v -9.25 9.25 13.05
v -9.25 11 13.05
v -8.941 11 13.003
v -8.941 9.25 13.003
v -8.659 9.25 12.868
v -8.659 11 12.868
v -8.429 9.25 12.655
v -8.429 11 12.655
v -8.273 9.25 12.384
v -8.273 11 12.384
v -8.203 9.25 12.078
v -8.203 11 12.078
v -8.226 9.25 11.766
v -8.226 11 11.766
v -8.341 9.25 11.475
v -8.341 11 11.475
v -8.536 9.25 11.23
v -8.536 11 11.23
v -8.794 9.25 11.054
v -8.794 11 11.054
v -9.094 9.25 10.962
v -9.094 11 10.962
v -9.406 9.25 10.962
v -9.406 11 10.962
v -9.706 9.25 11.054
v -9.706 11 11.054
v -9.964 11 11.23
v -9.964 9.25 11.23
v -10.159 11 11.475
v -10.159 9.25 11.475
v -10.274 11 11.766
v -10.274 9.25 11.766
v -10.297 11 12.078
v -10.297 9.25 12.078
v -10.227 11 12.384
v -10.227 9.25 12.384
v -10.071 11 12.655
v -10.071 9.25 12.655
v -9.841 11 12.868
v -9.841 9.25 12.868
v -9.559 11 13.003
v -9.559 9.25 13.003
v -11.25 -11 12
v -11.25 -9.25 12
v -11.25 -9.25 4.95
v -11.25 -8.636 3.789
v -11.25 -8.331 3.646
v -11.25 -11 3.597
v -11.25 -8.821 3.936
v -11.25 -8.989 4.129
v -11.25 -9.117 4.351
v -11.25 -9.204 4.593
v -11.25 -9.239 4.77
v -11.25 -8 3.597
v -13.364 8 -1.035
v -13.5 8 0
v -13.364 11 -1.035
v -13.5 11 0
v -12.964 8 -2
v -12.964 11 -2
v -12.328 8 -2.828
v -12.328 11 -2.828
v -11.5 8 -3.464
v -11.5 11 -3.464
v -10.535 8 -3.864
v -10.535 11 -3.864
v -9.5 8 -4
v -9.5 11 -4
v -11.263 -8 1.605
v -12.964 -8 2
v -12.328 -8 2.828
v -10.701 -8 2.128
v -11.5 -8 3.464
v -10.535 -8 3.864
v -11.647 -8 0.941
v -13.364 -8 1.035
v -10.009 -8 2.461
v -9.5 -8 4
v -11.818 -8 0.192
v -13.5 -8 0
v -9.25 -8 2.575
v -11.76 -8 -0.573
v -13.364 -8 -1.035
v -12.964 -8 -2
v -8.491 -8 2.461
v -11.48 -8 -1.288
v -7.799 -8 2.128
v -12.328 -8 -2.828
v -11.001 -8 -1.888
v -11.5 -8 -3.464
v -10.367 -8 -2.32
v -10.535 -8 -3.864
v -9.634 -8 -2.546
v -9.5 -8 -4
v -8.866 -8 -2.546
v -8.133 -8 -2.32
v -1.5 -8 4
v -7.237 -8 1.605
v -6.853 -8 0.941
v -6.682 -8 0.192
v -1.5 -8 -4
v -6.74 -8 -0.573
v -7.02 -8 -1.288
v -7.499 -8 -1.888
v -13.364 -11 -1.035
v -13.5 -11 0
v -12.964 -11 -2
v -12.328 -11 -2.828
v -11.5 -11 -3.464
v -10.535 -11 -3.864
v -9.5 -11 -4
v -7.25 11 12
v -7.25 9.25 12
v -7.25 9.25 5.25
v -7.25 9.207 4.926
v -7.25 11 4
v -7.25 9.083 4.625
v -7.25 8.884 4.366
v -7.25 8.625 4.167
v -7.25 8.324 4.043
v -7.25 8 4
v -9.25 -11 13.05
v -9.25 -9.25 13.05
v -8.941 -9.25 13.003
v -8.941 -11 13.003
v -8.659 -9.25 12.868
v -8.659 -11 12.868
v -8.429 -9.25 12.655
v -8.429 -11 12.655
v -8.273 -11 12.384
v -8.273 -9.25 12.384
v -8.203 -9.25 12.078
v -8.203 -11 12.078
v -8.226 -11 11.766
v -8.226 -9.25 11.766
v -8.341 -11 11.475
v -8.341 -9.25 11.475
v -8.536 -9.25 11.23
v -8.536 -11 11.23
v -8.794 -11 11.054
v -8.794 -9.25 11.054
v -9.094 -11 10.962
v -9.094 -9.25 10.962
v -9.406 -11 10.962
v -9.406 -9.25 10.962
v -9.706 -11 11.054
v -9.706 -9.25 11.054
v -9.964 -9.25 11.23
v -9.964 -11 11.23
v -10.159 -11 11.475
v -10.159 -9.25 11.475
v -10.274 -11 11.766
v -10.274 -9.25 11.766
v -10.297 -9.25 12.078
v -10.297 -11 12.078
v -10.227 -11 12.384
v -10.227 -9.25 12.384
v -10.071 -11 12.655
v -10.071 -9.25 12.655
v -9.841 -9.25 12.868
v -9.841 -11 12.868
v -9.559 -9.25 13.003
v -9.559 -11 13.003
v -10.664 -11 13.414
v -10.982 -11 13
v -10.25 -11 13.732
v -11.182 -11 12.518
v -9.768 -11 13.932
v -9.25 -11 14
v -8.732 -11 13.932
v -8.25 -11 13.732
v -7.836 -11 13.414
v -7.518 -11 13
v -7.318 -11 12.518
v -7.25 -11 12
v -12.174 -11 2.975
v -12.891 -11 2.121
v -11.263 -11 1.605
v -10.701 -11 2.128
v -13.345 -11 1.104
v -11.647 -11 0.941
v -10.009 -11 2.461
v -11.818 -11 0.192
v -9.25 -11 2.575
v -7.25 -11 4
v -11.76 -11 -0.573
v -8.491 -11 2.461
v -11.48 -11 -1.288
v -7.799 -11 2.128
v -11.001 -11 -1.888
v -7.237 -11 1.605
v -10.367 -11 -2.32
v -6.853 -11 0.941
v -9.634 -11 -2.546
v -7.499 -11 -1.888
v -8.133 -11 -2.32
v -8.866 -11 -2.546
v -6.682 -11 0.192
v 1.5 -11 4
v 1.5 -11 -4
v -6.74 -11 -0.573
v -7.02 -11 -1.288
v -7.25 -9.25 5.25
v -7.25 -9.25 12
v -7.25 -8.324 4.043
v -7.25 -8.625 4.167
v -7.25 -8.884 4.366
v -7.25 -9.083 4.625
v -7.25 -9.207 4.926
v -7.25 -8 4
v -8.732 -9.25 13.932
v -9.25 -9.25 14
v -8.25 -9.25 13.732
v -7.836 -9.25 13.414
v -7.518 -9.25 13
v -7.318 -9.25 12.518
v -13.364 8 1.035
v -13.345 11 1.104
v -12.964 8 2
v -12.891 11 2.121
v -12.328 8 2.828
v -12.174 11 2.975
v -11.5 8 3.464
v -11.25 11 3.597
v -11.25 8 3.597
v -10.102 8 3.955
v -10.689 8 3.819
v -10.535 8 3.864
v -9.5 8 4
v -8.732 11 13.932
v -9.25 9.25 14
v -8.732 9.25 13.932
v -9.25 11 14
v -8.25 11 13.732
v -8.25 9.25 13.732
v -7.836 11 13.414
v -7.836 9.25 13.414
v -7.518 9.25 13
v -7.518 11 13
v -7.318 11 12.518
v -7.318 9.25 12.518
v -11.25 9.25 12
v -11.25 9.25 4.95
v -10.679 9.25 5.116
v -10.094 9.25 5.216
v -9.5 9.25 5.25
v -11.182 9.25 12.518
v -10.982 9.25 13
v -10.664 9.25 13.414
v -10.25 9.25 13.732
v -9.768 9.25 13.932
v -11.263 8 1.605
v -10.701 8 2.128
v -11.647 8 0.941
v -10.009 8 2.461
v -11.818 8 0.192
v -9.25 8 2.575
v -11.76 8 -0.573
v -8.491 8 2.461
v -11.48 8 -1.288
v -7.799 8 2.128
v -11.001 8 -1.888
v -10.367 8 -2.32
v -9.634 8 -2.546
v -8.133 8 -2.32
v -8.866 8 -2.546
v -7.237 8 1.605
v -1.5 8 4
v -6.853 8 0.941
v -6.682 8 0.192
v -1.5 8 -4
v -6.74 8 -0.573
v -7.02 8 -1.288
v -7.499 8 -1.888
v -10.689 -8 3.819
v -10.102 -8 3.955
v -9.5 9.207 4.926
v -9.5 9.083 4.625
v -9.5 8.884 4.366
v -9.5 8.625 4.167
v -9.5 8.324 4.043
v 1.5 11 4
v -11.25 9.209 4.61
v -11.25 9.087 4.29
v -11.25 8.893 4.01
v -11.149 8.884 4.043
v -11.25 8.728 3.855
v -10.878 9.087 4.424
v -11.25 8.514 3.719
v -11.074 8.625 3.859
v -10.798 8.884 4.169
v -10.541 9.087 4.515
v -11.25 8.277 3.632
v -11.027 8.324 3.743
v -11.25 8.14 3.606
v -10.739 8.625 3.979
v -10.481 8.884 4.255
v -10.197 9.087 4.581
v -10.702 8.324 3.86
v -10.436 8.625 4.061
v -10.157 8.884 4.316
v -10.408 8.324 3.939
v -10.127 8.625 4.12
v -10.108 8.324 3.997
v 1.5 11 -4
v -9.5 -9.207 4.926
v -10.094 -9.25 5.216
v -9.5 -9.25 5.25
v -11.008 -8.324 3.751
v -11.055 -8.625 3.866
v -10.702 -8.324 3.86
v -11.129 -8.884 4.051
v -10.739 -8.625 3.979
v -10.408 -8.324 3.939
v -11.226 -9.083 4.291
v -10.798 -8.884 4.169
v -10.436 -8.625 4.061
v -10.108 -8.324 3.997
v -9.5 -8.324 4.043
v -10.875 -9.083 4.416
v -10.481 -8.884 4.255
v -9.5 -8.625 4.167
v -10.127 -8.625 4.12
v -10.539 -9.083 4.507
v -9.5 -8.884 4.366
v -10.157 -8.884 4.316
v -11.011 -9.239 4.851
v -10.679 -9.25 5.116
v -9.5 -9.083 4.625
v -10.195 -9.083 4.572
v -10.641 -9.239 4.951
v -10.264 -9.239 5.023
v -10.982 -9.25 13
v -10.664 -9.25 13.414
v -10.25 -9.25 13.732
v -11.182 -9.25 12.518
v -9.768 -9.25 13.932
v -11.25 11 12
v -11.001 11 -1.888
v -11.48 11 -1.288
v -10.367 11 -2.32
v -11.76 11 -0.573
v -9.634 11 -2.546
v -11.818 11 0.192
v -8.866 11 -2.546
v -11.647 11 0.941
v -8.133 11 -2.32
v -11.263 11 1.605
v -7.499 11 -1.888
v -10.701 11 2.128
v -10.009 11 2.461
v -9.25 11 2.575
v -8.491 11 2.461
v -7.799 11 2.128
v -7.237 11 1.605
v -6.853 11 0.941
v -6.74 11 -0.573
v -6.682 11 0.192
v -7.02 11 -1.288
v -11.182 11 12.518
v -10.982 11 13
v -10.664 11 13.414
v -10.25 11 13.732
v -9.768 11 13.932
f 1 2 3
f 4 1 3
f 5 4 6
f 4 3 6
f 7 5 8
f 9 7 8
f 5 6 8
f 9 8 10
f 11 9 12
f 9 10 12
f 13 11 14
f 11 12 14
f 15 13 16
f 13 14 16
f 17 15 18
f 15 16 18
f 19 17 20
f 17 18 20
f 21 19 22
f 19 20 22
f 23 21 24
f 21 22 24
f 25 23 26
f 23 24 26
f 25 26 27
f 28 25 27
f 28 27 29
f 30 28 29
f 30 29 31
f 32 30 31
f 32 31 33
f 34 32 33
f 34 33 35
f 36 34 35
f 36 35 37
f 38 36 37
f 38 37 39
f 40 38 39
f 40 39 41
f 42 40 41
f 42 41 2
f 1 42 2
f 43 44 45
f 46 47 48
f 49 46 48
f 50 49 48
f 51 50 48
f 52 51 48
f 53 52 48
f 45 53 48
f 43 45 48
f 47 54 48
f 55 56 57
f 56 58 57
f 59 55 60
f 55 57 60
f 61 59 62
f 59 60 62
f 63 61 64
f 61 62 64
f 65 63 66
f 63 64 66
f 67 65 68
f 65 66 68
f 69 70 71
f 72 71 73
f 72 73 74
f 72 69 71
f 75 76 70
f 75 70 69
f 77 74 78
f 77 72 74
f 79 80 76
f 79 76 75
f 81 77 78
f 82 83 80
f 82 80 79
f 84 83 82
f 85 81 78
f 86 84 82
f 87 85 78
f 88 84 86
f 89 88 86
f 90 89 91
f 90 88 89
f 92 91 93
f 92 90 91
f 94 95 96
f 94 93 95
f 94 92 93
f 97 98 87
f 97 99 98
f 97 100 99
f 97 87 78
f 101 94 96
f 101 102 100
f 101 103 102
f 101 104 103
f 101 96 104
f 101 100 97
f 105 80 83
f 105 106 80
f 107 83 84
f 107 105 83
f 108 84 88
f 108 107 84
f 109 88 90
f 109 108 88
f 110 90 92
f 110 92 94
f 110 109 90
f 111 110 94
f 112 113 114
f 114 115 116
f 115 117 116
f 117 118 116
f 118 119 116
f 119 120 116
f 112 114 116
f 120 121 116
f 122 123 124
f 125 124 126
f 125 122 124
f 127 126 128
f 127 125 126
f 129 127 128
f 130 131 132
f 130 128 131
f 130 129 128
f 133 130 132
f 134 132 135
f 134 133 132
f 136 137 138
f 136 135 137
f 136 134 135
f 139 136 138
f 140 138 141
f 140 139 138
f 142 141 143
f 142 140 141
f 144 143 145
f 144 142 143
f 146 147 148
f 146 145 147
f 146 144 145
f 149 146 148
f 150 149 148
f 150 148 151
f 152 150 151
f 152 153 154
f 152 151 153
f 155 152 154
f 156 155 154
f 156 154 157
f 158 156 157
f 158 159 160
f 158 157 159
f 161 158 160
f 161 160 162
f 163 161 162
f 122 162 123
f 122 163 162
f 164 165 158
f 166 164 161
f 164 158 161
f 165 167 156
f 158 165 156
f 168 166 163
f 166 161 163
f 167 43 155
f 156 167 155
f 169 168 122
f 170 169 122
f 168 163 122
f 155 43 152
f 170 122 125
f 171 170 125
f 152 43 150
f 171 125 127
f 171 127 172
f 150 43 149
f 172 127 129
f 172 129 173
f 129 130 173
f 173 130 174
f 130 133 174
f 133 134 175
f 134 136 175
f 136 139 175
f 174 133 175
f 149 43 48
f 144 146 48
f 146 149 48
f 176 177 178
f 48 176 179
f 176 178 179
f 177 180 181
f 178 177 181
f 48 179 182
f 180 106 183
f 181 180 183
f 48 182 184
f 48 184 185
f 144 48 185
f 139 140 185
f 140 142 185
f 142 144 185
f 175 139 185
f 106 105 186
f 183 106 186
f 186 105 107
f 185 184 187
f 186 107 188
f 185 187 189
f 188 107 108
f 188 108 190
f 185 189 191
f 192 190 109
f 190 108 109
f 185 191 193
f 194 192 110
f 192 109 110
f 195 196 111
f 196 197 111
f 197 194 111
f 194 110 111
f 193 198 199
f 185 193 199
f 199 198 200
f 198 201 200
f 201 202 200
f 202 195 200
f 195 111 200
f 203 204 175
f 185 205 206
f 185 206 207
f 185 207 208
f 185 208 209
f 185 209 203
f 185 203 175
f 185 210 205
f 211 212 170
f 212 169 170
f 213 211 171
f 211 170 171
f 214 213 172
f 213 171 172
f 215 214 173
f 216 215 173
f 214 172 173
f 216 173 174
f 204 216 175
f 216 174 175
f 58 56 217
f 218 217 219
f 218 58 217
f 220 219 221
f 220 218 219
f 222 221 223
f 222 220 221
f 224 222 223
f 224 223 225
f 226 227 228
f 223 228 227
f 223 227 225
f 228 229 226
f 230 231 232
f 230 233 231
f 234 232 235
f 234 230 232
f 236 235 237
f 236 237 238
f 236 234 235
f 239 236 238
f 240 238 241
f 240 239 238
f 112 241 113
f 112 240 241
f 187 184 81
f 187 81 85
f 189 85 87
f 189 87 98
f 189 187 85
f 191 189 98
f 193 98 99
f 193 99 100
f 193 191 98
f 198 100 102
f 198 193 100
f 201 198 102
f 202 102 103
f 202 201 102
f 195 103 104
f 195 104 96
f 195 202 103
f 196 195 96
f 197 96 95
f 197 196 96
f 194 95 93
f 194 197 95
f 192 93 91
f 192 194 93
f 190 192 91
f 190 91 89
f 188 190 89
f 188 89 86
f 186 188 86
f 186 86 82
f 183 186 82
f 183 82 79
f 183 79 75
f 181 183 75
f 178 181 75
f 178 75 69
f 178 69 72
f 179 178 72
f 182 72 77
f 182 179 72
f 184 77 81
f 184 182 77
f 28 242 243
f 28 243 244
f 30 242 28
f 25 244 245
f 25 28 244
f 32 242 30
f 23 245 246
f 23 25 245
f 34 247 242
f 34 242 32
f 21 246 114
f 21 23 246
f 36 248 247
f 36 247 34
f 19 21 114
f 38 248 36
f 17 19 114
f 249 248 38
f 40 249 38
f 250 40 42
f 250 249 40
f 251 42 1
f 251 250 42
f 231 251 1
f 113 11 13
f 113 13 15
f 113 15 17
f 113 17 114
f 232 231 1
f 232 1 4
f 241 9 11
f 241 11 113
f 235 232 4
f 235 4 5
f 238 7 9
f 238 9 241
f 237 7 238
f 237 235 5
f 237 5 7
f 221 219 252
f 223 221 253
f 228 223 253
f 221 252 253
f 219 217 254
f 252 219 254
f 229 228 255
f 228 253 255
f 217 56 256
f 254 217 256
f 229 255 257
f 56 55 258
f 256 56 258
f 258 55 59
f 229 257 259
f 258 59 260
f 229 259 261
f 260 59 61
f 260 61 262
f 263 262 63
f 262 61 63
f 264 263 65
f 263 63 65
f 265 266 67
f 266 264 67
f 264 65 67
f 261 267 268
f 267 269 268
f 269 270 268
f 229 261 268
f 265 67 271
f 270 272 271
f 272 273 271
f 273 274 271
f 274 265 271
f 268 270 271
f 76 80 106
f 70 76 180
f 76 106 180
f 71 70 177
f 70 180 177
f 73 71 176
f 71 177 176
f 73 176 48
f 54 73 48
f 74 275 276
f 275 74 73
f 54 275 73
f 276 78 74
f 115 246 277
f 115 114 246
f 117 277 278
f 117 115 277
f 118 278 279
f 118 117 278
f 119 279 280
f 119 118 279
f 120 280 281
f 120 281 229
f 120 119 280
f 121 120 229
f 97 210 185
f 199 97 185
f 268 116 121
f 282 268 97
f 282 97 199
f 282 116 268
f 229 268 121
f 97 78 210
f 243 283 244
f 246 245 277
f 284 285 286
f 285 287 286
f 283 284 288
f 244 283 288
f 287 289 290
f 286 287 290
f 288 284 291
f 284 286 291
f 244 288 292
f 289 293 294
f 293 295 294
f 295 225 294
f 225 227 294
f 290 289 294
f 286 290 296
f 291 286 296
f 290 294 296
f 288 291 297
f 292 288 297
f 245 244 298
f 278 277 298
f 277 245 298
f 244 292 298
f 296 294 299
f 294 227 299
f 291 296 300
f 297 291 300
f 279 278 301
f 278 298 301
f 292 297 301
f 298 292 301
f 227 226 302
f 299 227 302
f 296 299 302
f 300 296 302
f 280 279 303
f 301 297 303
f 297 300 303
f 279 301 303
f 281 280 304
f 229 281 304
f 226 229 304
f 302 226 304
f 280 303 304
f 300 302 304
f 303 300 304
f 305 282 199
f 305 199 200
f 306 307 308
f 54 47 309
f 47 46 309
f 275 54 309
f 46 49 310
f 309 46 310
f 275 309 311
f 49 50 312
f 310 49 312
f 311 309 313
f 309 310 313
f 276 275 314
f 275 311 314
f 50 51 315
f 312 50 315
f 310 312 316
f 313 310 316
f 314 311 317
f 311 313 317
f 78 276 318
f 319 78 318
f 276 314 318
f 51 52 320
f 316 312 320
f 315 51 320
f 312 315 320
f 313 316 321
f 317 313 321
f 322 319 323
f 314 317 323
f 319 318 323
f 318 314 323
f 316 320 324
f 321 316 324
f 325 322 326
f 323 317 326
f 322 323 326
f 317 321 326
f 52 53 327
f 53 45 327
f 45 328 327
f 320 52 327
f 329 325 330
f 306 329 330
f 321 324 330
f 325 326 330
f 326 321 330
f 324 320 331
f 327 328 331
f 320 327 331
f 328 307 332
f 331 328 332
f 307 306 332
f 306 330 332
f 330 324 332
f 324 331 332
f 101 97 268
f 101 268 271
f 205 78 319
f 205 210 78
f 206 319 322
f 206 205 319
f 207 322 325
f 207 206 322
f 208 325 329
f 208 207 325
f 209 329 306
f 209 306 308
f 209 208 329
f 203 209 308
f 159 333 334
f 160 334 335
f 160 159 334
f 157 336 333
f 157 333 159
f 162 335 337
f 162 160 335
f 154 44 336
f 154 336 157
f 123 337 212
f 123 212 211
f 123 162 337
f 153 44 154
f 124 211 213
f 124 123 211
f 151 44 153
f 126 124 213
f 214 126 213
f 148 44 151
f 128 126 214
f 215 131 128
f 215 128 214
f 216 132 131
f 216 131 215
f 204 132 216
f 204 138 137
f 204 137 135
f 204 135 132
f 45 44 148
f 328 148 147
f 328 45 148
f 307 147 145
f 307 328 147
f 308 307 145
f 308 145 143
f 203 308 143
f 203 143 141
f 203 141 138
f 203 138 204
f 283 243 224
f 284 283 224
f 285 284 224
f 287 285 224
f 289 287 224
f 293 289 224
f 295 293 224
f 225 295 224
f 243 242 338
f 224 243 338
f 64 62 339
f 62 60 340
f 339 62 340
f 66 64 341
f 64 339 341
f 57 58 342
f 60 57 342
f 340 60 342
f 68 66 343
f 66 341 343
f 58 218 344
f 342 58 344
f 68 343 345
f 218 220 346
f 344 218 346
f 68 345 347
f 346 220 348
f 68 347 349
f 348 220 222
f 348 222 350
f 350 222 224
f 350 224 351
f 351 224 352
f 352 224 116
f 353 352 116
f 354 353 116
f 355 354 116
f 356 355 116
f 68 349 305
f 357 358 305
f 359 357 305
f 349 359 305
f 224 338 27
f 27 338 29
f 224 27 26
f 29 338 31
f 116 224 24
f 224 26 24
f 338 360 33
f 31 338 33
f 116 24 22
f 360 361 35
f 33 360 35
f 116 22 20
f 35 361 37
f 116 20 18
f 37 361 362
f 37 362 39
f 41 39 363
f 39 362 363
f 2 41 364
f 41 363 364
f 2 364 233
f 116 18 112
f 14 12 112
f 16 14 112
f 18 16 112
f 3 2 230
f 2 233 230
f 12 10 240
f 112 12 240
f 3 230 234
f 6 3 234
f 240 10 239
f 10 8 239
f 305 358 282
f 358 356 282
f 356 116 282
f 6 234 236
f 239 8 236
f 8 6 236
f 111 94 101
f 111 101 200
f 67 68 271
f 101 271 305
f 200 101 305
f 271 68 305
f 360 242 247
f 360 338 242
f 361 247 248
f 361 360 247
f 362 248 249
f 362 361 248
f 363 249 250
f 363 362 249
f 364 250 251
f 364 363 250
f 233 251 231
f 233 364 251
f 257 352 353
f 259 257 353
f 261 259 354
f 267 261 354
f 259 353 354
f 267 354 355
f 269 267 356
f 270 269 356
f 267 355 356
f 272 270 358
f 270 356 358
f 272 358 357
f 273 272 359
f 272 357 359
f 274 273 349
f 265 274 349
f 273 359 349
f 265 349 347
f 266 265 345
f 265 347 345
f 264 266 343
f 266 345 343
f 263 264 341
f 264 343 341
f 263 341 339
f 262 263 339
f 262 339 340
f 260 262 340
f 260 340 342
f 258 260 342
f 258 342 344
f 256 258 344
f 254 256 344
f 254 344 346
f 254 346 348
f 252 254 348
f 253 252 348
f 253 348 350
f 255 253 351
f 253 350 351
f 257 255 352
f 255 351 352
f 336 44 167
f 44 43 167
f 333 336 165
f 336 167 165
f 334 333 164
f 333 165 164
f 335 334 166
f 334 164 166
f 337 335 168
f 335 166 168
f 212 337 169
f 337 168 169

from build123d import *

# Parameters (mm, degrees)
SKETCH1_W                       = 3
SKETCH1_H                       = 8
BOSS_EXTRUDE1_DEPTH             = 8
SKETCH2_W                       = 15
SKETCH2_H                       = 8
BOSS_EXTRUDE2_DEPTH             = 3
SKETCH3_R                       = 2.575
CUT_EXTRUDE1_DEPTH              = 3
FILLET1_R                       = 4
SKETCH4_W                       = 4
SKETCH4_H                       = 1.75
BOSS_EXTRUDE3_DEPTH             = 10
BOSS_EXTRUDE3_DIRECTION_2_REACH = 21.164
SKETCH5_R                       = 1.05
CUT_EXTRUDE2_DEPTH              = 3
FILLET2_R                       = 2
FILLET3_R                       = 1.25
FILLET1_OF_MIRROR1_R            = 4
FILLET2_OF_MIRROR1_R            = 2
FILLET3_OF_MIRROR1_R            = 1.25


with BuildPart() as part:
    # Sketch1 → Boss-Extrude1 (new body)
    with BuildSketch(Plane(origin=(0, 0, 0), x_dir=(1, 0, 0), z_dir=(0, 1, 0))):
        Rectangle(SKETCH1_W, SKETCH1_H)
    boss_extrude1 = extrude(amount=BOSS_EXTRUDE1_DEPTH)

    # Sketch2 → Boss-Extrude2 (add)
    with BuildSketch(Plane(origin=(0, 8, 0), x_dir=(1, 0, 0), z_dir=(0, 1, 0))):
        with Locations((-6, 0)):
            Rectangle(SKETCH2_W, SKETCH2_H)
    boss_extrude2 = extrude(amount=BOSS_EXTRUDE2_DEPTH)

    # Sketch3 → Cut-Extrude1 (cut)
    with BuildSketch(Plane(origin=(0, 11, 0), x_dir=(1, 0, 0), z_dir=(0, 1, 0))):
        with Locations(Location((-9.25, 0, 0), (0, 0, 270))):
            Circle(SKETCH3_R)
    cut_extrude1 = extrude(amount=-CUT_EXTRUDE1_DEPTH, mode=Mode.SUBTRACT)

    # Fillet1
    fillet1_edges = [part.edges().sort_by_distance(p)[0] for p in [
        (-13.5, 9.5, 4),
        (-13.5, 9.5, -4),
    ]]
    fillet(fillet1_edges, radius=FILLET1_R - 0.0001)  # a hair under: the kernel refuses the full size

    # Sketch4 → Boss-Extrude3 (add)
    with BuildSketch(Plane.XY.offset(4)):
        with Locations((-9.25, 10.125)):
            Rectangle(SKETCH4_W, SKETCH4_H)
    boss_extrude3 = extrude(amount=BOSS_EXTRUDE3_DEPTH)

    # Sketch4 → Boss-Extrude3 direction 2 (add, up to next)
    with BuildSketch(Plane.XY.offset(4), mode=Mode.PRIVATE) as boss_extrude3_direction_2_sk1:
        with Locations((-9.25, 10.125)):
            Rectangle(SKETCH4_W, SKETCH4_H)
    boss_extrude3_direction_2_tool1 = extrude(boss_extrude3_direction_2_sk1.sketch, amount=-BOSS_EXTRUDE3_DIRECTION_2_REACH, mode=Mode.PRIVATE) - part.part
    boss_extrude3_direction_2 = boss_extrude3_direction_2_tool1.solids().sort_by_distance((-9.25, 10.125, 4))[0]
    add(boss_extrude3_direction_2)

    # Sketch5 → Cut-Extrude2 (cut)
    with BuildSketch(Plane(origin=(0, 11, 0), x_dir=(1, 0, 0), z_dir=(0, 1, 0))):
        with Locations(Location((-9.25, -12, 0), (0, 0, 270))):
            Circle(SKETCH5_R)
    cut_extrude2 = extrude(amount=-CUT_EXTRUDE2_DEPTH, mode=Mode.SUBTRACT)

    # Fillet2
    fillet2_edges = [part.edges().sort_by_distance(p)[0] for p in [
        (-11.25, 10.125, 14),
        (-7.25, 10.125, 14),
    ]]
    fillet(fillet2_edges, radius=FILLET2_R - 0.0001)  # a hair under: the kernel refuses the full size

    # Fillet3
    fillet3_edges = [part.edges().sort_by_distance(p)[0] for p in [
        (-8.37505, 9.25, 4),
        (-10.397962835, 9.25, 3.897925335),
    ]]
    fillet(fillet3_edges, radius=FILLET3_R - 0.0001)  # a hair under: the kernel refuses the full size

    # Mirror1: Boss-Extrude1, Boss-Extrude2, Cut-Extrude1, Boss-Extrude3, Boss-Extrude3 direction 2, Cut-Extrude2 across plane
    add(boss_extrude1.mirror(Plane.ZX))
    add(boss_extrude2.mirror(Plane.ZX))
    add(cut_extrude1.mirror(Plane.ZX), mode=Mode.SUBTRACT)
    add(boss_extrude3.mirror(Plane.ZX))
    add(boss_extrude3_direction_2.mirror(Plane.ZX))
    add(cut_extrude2.mirror(Plane.ZX), mode=Mode.SUBTRACT)

    # Fillet1 of Mirror1
    fillet1_of_mirror1_edges = [part.edges().sort_by_distance(p)[0] for p in [
        (-13.5, -9.5, 4),
        (-13.5, -9.5, -4),
    ]]
    fillet(fillet1_of_mirror1_edges, radius=FILLET1_OF_MIRROR1_R - 0.0001)  # a hair under: the kernel refuses the full size

    # Fillet2 of Mirror1
    fillet2_of_mirror1_edges = [part.edges().sort_by_distance(p)[0] for p in [
        (-11.25, -10.125, 14),
        (-7.25, -10.125, 14),
    ]]
    fillet(fillet2_of_mirror1_edges, radius=FILLET2_OF_MIRROR1_R - 0.0001)  # a hair under: the kernel refuses the full size

    # Fillet3 of Mirror1
    fillet3_of_mirror1_edges = [part.edges().sort_by_distance(p)[0] for p in [
        (-8.37505, -9.25, 4),
        (-10.397962835, -9.25, 3.897925335),
    ]]
    fillet(fillet3_of_mirror1_edges, radius=FILLET3_OF_MIRROR1_R - 0.0001)  # a hair under: the kernel refuses the full size


solid = part.part
